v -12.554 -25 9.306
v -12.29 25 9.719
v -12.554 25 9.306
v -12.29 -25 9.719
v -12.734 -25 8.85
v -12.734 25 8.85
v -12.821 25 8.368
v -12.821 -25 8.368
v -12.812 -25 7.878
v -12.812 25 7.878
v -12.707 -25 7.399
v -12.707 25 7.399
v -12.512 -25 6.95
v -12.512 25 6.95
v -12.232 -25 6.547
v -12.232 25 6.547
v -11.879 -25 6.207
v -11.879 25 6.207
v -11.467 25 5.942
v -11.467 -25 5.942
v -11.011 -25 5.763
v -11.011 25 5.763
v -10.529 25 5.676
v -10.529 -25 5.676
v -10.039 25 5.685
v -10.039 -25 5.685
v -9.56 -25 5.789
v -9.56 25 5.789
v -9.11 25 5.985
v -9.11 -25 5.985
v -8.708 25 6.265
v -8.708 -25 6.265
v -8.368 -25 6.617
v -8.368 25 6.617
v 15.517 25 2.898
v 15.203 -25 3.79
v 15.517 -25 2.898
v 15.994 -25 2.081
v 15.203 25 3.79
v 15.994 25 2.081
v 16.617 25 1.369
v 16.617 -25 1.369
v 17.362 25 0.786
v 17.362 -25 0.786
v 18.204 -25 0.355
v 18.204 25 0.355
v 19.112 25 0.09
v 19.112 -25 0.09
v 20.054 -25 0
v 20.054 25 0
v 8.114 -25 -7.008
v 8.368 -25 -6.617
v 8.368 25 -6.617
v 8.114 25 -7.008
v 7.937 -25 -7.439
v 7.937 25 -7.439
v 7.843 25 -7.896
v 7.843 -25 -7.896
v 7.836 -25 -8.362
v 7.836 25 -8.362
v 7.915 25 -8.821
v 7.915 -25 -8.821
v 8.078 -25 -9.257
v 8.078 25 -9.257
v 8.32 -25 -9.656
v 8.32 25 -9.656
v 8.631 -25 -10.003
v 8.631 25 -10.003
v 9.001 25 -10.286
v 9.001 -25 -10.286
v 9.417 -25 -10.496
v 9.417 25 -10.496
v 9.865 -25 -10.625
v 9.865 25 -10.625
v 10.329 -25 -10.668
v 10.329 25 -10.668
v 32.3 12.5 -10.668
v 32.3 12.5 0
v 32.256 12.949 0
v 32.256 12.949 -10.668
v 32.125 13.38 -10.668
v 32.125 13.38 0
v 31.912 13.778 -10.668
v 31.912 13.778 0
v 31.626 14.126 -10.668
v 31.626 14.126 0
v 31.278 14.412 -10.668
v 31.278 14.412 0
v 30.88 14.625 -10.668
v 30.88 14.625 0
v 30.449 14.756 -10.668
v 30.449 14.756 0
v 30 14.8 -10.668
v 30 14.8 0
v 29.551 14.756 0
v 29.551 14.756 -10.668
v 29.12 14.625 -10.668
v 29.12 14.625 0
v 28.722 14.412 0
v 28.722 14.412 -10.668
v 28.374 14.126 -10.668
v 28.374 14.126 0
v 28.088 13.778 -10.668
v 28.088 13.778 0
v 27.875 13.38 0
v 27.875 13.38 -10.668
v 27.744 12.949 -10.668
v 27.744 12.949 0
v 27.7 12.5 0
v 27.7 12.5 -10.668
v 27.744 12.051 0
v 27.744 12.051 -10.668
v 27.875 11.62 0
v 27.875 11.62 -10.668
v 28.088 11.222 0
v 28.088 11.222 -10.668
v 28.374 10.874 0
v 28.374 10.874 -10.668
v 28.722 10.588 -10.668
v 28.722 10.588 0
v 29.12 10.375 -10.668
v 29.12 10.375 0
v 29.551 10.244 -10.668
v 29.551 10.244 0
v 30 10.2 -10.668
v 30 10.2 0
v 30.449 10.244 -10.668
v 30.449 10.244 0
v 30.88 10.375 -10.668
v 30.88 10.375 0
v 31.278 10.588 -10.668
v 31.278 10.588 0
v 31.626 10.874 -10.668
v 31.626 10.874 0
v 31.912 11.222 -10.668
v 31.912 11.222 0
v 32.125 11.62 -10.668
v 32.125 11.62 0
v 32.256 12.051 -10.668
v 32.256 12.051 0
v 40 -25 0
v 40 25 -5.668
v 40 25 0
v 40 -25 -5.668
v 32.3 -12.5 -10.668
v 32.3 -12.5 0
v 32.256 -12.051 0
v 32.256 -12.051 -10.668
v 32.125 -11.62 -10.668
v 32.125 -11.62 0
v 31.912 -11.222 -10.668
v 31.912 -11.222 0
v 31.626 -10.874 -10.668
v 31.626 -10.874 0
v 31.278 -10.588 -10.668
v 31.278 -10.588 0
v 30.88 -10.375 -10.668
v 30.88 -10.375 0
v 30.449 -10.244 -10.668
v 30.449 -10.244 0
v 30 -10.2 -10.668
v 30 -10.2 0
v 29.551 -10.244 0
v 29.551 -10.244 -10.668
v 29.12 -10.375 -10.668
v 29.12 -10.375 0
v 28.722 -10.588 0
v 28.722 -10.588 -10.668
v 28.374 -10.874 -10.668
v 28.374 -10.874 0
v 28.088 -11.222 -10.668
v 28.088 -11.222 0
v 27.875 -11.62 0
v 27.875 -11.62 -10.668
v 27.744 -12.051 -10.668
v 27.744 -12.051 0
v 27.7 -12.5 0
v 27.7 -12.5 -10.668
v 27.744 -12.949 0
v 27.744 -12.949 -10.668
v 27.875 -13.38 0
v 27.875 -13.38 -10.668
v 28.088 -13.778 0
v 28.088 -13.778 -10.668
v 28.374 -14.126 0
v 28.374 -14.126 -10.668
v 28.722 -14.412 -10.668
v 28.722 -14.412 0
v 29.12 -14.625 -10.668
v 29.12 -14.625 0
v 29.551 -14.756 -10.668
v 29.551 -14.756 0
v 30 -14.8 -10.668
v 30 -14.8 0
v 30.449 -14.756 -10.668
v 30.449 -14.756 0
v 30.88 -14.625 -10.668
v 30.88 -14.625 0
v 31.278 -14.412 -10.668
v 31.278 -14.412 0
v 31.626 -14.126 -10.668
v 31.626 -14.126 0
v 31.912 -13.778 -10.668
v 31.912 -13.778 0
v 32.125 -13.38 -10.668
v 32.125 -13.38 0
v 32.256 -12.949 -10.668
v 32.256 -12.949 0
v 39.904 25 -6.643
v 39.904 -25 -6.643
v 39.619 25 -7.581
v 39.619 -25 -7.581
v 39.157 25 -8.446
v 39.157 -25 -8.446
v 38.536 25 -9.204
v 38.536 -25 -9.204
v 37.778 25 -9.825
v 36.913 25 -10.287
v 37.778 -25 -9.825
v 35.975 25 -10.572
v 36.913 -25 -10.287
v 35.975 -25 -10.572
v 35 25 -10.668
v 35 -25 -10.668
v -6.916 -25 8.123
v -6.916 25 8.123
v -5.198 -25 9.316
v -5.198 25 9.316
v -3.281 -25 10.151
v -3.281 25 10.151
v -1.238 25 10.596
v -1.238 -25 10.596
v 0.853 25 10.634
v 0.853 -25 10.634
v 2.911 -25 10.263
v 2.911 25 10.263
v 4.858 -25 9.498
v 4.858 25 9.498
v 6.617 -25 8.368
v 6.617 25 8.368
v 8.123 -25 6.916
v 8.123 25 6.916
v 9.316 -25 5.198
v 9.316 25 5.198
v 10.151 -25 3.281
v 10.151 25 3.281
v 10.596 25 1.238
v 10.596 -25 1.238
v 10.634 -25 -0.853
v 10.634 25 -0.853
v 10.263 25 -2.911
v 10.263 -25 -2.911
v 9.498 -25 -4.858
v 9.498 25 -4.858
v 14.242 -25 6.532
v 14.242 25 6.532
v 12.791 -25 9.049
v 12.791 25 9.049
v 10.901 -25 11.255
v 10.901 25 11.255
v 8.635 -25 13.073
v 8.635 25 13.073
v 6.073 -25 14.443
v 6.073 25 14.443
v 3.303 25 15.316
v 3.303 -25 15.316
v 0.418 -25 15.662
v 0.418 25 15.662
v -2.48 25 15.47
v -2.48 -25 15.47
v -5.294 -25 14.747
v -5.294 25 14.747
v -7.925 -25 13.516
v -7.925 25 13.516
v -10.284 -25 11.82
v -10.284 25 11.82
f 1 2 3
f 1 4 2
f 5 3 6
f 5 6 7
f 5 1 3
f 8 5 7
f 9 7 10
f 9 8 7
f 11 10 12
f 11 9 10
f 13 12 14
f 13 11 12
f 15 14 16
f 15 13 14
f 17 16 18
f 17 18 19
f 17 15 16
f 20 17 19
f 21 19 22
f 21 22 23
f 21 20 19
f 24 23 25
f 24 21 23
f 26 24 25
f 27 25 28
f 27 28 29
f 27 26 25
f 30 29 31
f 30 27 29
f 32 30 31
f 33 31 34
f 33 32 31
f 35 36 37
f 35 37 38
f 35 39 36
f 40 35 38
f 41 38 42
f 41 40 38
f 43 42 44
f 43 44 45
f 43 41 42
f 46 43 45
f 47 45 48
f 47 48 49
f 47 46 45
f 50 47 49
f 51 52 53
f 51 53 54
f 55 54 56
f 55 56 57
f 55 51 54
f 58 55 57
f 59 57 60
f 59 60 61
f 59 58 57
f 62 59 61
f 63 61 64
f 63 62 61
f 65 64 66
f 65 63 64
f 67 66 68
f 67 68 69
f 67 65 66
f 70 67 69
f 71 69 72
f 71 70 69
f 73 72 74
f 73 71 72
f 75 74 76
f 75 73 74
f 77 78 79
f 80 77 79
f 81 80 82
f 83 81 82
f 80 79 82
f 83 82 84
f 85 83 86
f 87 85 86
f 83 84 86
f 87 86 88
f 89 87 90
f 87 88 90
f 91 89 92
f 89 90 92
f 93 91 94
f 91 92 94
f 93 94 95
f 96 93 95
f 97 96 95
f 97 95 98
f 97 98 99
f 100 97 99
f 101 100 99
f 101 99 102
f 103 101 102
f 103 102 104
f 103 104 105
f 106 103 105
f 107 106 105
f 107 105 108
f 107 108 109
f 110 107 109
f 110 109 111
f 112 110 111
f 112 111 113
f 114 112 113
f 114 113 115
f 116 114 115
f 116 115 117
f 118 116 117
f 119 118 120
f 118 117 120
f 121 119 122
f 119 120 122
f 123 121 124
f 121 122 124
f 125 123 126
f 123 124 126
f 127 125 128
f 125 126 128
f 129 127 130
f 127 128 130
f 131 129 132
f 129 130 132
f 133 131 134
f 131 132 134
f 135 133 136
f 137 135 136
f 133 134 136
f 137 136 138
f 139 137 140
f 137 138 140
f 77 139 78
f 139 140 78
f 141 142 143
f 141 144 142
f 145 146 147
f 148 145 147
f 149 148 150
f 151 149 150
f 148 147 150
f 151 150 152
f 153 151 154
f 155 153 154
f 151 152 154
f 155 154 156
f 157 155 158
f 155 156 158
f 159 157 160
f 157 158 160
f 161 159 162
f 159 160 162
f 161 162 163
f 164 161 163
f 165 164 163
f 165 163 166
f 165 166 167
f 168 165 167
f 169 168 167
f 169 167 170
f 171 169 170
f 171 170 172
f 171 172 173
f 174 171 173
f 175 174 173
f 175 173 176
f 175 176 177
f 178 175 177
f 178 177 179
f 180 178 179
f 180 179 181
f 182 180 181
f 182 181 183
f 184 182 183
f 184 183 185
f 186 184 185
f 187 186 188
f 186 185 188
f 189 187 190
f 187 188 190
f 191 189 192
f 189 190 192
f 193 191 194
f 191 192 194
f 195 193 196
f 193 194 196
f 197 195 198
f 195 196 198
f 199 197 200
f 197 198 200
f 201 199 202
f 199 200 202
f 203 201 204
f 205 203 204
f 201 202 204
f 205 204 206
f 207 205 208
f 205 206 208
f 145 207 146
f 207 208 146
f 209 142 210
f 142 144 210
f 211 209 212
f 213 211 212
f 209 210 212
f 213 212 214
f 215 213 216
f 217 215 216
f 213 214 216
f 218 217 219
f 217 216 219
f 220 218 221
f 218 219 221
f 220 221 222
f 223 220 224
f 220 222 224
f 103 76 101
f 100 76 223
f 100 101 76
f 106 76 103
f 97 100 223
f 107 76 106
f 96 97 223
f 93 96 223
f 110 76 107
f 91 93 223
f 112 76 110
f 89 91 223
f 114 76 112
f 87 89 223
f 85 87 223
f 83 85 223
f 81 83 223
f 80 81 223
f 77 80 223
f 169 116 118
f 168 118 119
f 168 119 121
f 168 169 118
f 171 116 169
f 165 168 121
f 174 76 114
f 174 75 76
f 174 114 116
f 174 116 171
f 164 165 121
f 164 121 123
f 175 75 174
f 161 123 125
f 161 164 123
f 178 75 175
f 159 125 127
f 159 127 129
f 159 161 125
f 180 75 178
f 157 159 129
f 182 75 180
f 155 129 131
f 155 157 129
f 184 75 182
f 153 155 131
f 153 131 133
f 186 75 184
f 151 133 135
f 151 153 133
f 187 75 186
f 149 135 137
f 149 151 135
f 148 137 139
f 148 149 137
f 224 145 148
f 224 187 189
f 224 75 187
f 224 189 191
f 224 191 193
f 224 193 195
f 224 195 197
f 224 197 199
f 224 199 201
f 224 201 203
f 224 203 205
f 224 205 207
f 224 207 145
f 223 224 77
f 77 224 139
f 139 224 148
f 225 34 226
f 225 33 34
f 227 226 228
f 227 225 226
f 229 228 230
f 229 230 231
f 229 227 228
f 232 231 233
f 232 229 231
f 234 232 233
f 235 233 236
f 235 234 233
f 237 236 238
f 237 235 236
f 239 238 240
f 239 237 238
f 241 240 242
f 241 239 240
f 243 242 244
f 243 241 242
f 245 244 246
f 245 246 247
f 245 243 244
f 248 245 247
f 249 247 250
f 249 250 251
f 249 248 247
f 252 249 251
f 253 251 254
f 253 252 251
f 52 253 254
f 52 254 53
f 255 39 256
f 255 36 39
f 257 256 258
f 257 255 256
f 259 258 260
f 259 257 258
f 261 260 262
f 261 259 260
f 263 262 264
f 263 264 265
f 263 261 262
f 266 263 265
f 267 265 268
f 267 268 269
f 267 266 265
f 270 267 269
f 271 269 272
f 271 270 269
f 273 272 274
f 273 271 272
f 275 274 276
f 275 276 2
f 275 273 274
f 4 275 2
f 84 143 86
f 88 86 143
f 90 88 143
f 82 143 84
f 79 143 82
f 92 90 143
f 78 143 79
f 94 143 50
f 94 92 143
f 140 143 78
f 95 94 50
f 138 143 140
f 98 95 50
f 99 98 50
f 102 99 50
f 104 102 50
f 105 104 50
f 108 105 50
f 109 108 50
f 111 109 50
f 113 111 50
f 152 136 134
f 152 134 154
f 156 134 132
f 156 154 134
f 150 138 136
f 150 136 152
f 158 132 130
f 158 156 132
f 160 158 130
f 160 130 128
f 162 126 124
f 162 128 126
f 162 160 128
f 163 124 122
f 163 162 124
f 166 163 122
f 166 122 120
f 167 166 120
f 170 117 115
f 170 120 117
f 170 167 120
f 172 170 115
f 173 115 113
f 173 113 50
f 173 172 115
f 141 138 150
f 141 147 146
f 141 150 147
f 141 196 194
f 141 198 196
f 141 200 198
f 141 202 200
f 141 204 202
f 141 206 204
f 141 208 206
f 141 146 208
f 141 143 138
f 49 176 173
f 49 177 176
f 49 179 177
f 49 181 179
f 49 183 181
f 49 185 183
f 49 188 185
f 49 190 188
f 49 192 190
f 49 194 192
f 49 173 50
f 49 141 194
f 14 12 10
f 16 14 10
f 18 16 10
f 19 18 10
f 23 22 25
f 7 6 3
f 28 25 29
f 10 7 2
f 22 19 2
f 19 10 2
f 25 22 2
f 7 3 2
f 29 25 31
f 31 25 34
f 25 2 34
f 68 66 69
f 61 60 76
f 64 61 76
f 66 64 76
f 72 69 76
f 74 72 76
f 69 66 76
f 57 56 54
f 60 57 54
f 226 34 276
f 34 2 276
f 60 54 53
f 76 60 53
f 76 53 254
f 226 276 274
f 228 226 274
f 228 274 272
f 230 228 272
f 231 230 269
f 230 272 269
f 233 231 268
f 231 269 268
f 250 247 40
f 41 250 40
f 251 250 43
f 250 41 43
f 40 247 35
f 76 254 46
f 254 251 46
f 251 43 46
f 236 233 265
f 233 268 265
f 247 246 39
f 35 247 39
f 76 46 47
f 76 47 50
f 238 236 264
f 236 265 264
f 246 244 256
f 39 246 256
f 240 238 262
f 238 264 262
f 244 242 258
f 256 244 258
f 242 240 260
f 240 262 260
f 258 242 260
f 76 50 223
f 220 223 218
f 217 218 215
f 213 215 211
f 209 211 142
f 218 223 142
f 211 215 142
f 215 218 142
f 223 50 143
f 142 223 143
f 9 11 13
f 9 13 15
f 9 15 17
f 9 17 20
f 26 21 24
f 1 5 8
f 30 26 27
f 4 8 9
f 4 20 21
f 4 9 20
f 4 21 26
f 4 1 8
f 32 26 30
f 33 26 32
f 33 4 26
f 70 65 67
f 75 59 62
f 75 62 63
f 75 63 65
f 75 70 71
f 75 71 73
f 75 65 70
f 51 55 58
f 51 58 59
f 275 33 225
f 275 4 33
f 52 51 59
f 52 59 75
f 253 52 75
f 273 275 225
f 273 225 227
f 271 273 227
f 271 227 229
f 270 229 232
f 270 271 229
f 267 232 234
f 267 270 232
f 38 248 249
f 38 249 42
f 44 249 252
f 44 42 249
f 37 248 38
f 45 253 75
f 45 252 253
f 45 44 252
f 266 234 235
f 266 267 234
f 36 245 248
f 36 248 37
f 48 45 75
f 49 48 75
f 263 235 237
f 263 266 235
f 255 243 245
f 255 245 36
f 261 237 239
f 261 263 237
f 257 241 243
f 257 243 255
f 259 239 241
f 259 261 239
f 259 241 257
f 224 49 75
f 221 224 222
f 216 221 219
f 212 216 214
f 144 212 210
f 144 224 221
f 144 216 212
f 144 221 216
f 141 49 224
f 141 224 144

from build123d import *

# Parameters (mm, degrees)
F1_DEPTH = 25
F2_R     = 5
F3_R     = 2.3
F4_DEPTH = 10.669


with BuildPart() as f1:
    # F0 (on Front) → F1 (new body, symmetric)
    with BuildSketch(Plane.XZ):
        with BuildLine():
            ThreePointArc((-8.367673, 6.617271), (6.617271, 8.367673), (8.367673, -6.617271))
            ThreePointArc((8.367673, -6.617271), (8.078399, -9.257307), (10.328601, -10.668))
            Line((10.328601, -10.668), (40, -10.668))
            Line((40, -10.668), (40, 0))
            Line((40, 0), (15.668, 0))
            ThreePointArc((15.668, 0), (5.144603, 14.7993), (-12.289529, 9.718729))
            ThreePointArc((-12.289529, 9.718729), (-11.87933, 6.207072), (-8.367673, 6.617271))
        make_face()
    extrude(amount=F1_DEPTH, both=True)

    # F2
    f2_edges = [f1.edges().sort_by_distance(p)[0] for p in [
        (15.668, 0, 0),
        (40, 0, -10.668),
    ]]
    fillet(f2_edges, radius=F2_R)

    # F3 (on Top) → F4 (cut, through all)
    with BuildSketch(Plane.XY):
        with Locations((30, 12.5)):
            Circle(F3_R)
        with Locations((30, -12.5)):
            Circle(F3_R)
    extrude(amount=-F4_DEPTH, mode=Mode.SUBTRACT)


solid = f1.part
